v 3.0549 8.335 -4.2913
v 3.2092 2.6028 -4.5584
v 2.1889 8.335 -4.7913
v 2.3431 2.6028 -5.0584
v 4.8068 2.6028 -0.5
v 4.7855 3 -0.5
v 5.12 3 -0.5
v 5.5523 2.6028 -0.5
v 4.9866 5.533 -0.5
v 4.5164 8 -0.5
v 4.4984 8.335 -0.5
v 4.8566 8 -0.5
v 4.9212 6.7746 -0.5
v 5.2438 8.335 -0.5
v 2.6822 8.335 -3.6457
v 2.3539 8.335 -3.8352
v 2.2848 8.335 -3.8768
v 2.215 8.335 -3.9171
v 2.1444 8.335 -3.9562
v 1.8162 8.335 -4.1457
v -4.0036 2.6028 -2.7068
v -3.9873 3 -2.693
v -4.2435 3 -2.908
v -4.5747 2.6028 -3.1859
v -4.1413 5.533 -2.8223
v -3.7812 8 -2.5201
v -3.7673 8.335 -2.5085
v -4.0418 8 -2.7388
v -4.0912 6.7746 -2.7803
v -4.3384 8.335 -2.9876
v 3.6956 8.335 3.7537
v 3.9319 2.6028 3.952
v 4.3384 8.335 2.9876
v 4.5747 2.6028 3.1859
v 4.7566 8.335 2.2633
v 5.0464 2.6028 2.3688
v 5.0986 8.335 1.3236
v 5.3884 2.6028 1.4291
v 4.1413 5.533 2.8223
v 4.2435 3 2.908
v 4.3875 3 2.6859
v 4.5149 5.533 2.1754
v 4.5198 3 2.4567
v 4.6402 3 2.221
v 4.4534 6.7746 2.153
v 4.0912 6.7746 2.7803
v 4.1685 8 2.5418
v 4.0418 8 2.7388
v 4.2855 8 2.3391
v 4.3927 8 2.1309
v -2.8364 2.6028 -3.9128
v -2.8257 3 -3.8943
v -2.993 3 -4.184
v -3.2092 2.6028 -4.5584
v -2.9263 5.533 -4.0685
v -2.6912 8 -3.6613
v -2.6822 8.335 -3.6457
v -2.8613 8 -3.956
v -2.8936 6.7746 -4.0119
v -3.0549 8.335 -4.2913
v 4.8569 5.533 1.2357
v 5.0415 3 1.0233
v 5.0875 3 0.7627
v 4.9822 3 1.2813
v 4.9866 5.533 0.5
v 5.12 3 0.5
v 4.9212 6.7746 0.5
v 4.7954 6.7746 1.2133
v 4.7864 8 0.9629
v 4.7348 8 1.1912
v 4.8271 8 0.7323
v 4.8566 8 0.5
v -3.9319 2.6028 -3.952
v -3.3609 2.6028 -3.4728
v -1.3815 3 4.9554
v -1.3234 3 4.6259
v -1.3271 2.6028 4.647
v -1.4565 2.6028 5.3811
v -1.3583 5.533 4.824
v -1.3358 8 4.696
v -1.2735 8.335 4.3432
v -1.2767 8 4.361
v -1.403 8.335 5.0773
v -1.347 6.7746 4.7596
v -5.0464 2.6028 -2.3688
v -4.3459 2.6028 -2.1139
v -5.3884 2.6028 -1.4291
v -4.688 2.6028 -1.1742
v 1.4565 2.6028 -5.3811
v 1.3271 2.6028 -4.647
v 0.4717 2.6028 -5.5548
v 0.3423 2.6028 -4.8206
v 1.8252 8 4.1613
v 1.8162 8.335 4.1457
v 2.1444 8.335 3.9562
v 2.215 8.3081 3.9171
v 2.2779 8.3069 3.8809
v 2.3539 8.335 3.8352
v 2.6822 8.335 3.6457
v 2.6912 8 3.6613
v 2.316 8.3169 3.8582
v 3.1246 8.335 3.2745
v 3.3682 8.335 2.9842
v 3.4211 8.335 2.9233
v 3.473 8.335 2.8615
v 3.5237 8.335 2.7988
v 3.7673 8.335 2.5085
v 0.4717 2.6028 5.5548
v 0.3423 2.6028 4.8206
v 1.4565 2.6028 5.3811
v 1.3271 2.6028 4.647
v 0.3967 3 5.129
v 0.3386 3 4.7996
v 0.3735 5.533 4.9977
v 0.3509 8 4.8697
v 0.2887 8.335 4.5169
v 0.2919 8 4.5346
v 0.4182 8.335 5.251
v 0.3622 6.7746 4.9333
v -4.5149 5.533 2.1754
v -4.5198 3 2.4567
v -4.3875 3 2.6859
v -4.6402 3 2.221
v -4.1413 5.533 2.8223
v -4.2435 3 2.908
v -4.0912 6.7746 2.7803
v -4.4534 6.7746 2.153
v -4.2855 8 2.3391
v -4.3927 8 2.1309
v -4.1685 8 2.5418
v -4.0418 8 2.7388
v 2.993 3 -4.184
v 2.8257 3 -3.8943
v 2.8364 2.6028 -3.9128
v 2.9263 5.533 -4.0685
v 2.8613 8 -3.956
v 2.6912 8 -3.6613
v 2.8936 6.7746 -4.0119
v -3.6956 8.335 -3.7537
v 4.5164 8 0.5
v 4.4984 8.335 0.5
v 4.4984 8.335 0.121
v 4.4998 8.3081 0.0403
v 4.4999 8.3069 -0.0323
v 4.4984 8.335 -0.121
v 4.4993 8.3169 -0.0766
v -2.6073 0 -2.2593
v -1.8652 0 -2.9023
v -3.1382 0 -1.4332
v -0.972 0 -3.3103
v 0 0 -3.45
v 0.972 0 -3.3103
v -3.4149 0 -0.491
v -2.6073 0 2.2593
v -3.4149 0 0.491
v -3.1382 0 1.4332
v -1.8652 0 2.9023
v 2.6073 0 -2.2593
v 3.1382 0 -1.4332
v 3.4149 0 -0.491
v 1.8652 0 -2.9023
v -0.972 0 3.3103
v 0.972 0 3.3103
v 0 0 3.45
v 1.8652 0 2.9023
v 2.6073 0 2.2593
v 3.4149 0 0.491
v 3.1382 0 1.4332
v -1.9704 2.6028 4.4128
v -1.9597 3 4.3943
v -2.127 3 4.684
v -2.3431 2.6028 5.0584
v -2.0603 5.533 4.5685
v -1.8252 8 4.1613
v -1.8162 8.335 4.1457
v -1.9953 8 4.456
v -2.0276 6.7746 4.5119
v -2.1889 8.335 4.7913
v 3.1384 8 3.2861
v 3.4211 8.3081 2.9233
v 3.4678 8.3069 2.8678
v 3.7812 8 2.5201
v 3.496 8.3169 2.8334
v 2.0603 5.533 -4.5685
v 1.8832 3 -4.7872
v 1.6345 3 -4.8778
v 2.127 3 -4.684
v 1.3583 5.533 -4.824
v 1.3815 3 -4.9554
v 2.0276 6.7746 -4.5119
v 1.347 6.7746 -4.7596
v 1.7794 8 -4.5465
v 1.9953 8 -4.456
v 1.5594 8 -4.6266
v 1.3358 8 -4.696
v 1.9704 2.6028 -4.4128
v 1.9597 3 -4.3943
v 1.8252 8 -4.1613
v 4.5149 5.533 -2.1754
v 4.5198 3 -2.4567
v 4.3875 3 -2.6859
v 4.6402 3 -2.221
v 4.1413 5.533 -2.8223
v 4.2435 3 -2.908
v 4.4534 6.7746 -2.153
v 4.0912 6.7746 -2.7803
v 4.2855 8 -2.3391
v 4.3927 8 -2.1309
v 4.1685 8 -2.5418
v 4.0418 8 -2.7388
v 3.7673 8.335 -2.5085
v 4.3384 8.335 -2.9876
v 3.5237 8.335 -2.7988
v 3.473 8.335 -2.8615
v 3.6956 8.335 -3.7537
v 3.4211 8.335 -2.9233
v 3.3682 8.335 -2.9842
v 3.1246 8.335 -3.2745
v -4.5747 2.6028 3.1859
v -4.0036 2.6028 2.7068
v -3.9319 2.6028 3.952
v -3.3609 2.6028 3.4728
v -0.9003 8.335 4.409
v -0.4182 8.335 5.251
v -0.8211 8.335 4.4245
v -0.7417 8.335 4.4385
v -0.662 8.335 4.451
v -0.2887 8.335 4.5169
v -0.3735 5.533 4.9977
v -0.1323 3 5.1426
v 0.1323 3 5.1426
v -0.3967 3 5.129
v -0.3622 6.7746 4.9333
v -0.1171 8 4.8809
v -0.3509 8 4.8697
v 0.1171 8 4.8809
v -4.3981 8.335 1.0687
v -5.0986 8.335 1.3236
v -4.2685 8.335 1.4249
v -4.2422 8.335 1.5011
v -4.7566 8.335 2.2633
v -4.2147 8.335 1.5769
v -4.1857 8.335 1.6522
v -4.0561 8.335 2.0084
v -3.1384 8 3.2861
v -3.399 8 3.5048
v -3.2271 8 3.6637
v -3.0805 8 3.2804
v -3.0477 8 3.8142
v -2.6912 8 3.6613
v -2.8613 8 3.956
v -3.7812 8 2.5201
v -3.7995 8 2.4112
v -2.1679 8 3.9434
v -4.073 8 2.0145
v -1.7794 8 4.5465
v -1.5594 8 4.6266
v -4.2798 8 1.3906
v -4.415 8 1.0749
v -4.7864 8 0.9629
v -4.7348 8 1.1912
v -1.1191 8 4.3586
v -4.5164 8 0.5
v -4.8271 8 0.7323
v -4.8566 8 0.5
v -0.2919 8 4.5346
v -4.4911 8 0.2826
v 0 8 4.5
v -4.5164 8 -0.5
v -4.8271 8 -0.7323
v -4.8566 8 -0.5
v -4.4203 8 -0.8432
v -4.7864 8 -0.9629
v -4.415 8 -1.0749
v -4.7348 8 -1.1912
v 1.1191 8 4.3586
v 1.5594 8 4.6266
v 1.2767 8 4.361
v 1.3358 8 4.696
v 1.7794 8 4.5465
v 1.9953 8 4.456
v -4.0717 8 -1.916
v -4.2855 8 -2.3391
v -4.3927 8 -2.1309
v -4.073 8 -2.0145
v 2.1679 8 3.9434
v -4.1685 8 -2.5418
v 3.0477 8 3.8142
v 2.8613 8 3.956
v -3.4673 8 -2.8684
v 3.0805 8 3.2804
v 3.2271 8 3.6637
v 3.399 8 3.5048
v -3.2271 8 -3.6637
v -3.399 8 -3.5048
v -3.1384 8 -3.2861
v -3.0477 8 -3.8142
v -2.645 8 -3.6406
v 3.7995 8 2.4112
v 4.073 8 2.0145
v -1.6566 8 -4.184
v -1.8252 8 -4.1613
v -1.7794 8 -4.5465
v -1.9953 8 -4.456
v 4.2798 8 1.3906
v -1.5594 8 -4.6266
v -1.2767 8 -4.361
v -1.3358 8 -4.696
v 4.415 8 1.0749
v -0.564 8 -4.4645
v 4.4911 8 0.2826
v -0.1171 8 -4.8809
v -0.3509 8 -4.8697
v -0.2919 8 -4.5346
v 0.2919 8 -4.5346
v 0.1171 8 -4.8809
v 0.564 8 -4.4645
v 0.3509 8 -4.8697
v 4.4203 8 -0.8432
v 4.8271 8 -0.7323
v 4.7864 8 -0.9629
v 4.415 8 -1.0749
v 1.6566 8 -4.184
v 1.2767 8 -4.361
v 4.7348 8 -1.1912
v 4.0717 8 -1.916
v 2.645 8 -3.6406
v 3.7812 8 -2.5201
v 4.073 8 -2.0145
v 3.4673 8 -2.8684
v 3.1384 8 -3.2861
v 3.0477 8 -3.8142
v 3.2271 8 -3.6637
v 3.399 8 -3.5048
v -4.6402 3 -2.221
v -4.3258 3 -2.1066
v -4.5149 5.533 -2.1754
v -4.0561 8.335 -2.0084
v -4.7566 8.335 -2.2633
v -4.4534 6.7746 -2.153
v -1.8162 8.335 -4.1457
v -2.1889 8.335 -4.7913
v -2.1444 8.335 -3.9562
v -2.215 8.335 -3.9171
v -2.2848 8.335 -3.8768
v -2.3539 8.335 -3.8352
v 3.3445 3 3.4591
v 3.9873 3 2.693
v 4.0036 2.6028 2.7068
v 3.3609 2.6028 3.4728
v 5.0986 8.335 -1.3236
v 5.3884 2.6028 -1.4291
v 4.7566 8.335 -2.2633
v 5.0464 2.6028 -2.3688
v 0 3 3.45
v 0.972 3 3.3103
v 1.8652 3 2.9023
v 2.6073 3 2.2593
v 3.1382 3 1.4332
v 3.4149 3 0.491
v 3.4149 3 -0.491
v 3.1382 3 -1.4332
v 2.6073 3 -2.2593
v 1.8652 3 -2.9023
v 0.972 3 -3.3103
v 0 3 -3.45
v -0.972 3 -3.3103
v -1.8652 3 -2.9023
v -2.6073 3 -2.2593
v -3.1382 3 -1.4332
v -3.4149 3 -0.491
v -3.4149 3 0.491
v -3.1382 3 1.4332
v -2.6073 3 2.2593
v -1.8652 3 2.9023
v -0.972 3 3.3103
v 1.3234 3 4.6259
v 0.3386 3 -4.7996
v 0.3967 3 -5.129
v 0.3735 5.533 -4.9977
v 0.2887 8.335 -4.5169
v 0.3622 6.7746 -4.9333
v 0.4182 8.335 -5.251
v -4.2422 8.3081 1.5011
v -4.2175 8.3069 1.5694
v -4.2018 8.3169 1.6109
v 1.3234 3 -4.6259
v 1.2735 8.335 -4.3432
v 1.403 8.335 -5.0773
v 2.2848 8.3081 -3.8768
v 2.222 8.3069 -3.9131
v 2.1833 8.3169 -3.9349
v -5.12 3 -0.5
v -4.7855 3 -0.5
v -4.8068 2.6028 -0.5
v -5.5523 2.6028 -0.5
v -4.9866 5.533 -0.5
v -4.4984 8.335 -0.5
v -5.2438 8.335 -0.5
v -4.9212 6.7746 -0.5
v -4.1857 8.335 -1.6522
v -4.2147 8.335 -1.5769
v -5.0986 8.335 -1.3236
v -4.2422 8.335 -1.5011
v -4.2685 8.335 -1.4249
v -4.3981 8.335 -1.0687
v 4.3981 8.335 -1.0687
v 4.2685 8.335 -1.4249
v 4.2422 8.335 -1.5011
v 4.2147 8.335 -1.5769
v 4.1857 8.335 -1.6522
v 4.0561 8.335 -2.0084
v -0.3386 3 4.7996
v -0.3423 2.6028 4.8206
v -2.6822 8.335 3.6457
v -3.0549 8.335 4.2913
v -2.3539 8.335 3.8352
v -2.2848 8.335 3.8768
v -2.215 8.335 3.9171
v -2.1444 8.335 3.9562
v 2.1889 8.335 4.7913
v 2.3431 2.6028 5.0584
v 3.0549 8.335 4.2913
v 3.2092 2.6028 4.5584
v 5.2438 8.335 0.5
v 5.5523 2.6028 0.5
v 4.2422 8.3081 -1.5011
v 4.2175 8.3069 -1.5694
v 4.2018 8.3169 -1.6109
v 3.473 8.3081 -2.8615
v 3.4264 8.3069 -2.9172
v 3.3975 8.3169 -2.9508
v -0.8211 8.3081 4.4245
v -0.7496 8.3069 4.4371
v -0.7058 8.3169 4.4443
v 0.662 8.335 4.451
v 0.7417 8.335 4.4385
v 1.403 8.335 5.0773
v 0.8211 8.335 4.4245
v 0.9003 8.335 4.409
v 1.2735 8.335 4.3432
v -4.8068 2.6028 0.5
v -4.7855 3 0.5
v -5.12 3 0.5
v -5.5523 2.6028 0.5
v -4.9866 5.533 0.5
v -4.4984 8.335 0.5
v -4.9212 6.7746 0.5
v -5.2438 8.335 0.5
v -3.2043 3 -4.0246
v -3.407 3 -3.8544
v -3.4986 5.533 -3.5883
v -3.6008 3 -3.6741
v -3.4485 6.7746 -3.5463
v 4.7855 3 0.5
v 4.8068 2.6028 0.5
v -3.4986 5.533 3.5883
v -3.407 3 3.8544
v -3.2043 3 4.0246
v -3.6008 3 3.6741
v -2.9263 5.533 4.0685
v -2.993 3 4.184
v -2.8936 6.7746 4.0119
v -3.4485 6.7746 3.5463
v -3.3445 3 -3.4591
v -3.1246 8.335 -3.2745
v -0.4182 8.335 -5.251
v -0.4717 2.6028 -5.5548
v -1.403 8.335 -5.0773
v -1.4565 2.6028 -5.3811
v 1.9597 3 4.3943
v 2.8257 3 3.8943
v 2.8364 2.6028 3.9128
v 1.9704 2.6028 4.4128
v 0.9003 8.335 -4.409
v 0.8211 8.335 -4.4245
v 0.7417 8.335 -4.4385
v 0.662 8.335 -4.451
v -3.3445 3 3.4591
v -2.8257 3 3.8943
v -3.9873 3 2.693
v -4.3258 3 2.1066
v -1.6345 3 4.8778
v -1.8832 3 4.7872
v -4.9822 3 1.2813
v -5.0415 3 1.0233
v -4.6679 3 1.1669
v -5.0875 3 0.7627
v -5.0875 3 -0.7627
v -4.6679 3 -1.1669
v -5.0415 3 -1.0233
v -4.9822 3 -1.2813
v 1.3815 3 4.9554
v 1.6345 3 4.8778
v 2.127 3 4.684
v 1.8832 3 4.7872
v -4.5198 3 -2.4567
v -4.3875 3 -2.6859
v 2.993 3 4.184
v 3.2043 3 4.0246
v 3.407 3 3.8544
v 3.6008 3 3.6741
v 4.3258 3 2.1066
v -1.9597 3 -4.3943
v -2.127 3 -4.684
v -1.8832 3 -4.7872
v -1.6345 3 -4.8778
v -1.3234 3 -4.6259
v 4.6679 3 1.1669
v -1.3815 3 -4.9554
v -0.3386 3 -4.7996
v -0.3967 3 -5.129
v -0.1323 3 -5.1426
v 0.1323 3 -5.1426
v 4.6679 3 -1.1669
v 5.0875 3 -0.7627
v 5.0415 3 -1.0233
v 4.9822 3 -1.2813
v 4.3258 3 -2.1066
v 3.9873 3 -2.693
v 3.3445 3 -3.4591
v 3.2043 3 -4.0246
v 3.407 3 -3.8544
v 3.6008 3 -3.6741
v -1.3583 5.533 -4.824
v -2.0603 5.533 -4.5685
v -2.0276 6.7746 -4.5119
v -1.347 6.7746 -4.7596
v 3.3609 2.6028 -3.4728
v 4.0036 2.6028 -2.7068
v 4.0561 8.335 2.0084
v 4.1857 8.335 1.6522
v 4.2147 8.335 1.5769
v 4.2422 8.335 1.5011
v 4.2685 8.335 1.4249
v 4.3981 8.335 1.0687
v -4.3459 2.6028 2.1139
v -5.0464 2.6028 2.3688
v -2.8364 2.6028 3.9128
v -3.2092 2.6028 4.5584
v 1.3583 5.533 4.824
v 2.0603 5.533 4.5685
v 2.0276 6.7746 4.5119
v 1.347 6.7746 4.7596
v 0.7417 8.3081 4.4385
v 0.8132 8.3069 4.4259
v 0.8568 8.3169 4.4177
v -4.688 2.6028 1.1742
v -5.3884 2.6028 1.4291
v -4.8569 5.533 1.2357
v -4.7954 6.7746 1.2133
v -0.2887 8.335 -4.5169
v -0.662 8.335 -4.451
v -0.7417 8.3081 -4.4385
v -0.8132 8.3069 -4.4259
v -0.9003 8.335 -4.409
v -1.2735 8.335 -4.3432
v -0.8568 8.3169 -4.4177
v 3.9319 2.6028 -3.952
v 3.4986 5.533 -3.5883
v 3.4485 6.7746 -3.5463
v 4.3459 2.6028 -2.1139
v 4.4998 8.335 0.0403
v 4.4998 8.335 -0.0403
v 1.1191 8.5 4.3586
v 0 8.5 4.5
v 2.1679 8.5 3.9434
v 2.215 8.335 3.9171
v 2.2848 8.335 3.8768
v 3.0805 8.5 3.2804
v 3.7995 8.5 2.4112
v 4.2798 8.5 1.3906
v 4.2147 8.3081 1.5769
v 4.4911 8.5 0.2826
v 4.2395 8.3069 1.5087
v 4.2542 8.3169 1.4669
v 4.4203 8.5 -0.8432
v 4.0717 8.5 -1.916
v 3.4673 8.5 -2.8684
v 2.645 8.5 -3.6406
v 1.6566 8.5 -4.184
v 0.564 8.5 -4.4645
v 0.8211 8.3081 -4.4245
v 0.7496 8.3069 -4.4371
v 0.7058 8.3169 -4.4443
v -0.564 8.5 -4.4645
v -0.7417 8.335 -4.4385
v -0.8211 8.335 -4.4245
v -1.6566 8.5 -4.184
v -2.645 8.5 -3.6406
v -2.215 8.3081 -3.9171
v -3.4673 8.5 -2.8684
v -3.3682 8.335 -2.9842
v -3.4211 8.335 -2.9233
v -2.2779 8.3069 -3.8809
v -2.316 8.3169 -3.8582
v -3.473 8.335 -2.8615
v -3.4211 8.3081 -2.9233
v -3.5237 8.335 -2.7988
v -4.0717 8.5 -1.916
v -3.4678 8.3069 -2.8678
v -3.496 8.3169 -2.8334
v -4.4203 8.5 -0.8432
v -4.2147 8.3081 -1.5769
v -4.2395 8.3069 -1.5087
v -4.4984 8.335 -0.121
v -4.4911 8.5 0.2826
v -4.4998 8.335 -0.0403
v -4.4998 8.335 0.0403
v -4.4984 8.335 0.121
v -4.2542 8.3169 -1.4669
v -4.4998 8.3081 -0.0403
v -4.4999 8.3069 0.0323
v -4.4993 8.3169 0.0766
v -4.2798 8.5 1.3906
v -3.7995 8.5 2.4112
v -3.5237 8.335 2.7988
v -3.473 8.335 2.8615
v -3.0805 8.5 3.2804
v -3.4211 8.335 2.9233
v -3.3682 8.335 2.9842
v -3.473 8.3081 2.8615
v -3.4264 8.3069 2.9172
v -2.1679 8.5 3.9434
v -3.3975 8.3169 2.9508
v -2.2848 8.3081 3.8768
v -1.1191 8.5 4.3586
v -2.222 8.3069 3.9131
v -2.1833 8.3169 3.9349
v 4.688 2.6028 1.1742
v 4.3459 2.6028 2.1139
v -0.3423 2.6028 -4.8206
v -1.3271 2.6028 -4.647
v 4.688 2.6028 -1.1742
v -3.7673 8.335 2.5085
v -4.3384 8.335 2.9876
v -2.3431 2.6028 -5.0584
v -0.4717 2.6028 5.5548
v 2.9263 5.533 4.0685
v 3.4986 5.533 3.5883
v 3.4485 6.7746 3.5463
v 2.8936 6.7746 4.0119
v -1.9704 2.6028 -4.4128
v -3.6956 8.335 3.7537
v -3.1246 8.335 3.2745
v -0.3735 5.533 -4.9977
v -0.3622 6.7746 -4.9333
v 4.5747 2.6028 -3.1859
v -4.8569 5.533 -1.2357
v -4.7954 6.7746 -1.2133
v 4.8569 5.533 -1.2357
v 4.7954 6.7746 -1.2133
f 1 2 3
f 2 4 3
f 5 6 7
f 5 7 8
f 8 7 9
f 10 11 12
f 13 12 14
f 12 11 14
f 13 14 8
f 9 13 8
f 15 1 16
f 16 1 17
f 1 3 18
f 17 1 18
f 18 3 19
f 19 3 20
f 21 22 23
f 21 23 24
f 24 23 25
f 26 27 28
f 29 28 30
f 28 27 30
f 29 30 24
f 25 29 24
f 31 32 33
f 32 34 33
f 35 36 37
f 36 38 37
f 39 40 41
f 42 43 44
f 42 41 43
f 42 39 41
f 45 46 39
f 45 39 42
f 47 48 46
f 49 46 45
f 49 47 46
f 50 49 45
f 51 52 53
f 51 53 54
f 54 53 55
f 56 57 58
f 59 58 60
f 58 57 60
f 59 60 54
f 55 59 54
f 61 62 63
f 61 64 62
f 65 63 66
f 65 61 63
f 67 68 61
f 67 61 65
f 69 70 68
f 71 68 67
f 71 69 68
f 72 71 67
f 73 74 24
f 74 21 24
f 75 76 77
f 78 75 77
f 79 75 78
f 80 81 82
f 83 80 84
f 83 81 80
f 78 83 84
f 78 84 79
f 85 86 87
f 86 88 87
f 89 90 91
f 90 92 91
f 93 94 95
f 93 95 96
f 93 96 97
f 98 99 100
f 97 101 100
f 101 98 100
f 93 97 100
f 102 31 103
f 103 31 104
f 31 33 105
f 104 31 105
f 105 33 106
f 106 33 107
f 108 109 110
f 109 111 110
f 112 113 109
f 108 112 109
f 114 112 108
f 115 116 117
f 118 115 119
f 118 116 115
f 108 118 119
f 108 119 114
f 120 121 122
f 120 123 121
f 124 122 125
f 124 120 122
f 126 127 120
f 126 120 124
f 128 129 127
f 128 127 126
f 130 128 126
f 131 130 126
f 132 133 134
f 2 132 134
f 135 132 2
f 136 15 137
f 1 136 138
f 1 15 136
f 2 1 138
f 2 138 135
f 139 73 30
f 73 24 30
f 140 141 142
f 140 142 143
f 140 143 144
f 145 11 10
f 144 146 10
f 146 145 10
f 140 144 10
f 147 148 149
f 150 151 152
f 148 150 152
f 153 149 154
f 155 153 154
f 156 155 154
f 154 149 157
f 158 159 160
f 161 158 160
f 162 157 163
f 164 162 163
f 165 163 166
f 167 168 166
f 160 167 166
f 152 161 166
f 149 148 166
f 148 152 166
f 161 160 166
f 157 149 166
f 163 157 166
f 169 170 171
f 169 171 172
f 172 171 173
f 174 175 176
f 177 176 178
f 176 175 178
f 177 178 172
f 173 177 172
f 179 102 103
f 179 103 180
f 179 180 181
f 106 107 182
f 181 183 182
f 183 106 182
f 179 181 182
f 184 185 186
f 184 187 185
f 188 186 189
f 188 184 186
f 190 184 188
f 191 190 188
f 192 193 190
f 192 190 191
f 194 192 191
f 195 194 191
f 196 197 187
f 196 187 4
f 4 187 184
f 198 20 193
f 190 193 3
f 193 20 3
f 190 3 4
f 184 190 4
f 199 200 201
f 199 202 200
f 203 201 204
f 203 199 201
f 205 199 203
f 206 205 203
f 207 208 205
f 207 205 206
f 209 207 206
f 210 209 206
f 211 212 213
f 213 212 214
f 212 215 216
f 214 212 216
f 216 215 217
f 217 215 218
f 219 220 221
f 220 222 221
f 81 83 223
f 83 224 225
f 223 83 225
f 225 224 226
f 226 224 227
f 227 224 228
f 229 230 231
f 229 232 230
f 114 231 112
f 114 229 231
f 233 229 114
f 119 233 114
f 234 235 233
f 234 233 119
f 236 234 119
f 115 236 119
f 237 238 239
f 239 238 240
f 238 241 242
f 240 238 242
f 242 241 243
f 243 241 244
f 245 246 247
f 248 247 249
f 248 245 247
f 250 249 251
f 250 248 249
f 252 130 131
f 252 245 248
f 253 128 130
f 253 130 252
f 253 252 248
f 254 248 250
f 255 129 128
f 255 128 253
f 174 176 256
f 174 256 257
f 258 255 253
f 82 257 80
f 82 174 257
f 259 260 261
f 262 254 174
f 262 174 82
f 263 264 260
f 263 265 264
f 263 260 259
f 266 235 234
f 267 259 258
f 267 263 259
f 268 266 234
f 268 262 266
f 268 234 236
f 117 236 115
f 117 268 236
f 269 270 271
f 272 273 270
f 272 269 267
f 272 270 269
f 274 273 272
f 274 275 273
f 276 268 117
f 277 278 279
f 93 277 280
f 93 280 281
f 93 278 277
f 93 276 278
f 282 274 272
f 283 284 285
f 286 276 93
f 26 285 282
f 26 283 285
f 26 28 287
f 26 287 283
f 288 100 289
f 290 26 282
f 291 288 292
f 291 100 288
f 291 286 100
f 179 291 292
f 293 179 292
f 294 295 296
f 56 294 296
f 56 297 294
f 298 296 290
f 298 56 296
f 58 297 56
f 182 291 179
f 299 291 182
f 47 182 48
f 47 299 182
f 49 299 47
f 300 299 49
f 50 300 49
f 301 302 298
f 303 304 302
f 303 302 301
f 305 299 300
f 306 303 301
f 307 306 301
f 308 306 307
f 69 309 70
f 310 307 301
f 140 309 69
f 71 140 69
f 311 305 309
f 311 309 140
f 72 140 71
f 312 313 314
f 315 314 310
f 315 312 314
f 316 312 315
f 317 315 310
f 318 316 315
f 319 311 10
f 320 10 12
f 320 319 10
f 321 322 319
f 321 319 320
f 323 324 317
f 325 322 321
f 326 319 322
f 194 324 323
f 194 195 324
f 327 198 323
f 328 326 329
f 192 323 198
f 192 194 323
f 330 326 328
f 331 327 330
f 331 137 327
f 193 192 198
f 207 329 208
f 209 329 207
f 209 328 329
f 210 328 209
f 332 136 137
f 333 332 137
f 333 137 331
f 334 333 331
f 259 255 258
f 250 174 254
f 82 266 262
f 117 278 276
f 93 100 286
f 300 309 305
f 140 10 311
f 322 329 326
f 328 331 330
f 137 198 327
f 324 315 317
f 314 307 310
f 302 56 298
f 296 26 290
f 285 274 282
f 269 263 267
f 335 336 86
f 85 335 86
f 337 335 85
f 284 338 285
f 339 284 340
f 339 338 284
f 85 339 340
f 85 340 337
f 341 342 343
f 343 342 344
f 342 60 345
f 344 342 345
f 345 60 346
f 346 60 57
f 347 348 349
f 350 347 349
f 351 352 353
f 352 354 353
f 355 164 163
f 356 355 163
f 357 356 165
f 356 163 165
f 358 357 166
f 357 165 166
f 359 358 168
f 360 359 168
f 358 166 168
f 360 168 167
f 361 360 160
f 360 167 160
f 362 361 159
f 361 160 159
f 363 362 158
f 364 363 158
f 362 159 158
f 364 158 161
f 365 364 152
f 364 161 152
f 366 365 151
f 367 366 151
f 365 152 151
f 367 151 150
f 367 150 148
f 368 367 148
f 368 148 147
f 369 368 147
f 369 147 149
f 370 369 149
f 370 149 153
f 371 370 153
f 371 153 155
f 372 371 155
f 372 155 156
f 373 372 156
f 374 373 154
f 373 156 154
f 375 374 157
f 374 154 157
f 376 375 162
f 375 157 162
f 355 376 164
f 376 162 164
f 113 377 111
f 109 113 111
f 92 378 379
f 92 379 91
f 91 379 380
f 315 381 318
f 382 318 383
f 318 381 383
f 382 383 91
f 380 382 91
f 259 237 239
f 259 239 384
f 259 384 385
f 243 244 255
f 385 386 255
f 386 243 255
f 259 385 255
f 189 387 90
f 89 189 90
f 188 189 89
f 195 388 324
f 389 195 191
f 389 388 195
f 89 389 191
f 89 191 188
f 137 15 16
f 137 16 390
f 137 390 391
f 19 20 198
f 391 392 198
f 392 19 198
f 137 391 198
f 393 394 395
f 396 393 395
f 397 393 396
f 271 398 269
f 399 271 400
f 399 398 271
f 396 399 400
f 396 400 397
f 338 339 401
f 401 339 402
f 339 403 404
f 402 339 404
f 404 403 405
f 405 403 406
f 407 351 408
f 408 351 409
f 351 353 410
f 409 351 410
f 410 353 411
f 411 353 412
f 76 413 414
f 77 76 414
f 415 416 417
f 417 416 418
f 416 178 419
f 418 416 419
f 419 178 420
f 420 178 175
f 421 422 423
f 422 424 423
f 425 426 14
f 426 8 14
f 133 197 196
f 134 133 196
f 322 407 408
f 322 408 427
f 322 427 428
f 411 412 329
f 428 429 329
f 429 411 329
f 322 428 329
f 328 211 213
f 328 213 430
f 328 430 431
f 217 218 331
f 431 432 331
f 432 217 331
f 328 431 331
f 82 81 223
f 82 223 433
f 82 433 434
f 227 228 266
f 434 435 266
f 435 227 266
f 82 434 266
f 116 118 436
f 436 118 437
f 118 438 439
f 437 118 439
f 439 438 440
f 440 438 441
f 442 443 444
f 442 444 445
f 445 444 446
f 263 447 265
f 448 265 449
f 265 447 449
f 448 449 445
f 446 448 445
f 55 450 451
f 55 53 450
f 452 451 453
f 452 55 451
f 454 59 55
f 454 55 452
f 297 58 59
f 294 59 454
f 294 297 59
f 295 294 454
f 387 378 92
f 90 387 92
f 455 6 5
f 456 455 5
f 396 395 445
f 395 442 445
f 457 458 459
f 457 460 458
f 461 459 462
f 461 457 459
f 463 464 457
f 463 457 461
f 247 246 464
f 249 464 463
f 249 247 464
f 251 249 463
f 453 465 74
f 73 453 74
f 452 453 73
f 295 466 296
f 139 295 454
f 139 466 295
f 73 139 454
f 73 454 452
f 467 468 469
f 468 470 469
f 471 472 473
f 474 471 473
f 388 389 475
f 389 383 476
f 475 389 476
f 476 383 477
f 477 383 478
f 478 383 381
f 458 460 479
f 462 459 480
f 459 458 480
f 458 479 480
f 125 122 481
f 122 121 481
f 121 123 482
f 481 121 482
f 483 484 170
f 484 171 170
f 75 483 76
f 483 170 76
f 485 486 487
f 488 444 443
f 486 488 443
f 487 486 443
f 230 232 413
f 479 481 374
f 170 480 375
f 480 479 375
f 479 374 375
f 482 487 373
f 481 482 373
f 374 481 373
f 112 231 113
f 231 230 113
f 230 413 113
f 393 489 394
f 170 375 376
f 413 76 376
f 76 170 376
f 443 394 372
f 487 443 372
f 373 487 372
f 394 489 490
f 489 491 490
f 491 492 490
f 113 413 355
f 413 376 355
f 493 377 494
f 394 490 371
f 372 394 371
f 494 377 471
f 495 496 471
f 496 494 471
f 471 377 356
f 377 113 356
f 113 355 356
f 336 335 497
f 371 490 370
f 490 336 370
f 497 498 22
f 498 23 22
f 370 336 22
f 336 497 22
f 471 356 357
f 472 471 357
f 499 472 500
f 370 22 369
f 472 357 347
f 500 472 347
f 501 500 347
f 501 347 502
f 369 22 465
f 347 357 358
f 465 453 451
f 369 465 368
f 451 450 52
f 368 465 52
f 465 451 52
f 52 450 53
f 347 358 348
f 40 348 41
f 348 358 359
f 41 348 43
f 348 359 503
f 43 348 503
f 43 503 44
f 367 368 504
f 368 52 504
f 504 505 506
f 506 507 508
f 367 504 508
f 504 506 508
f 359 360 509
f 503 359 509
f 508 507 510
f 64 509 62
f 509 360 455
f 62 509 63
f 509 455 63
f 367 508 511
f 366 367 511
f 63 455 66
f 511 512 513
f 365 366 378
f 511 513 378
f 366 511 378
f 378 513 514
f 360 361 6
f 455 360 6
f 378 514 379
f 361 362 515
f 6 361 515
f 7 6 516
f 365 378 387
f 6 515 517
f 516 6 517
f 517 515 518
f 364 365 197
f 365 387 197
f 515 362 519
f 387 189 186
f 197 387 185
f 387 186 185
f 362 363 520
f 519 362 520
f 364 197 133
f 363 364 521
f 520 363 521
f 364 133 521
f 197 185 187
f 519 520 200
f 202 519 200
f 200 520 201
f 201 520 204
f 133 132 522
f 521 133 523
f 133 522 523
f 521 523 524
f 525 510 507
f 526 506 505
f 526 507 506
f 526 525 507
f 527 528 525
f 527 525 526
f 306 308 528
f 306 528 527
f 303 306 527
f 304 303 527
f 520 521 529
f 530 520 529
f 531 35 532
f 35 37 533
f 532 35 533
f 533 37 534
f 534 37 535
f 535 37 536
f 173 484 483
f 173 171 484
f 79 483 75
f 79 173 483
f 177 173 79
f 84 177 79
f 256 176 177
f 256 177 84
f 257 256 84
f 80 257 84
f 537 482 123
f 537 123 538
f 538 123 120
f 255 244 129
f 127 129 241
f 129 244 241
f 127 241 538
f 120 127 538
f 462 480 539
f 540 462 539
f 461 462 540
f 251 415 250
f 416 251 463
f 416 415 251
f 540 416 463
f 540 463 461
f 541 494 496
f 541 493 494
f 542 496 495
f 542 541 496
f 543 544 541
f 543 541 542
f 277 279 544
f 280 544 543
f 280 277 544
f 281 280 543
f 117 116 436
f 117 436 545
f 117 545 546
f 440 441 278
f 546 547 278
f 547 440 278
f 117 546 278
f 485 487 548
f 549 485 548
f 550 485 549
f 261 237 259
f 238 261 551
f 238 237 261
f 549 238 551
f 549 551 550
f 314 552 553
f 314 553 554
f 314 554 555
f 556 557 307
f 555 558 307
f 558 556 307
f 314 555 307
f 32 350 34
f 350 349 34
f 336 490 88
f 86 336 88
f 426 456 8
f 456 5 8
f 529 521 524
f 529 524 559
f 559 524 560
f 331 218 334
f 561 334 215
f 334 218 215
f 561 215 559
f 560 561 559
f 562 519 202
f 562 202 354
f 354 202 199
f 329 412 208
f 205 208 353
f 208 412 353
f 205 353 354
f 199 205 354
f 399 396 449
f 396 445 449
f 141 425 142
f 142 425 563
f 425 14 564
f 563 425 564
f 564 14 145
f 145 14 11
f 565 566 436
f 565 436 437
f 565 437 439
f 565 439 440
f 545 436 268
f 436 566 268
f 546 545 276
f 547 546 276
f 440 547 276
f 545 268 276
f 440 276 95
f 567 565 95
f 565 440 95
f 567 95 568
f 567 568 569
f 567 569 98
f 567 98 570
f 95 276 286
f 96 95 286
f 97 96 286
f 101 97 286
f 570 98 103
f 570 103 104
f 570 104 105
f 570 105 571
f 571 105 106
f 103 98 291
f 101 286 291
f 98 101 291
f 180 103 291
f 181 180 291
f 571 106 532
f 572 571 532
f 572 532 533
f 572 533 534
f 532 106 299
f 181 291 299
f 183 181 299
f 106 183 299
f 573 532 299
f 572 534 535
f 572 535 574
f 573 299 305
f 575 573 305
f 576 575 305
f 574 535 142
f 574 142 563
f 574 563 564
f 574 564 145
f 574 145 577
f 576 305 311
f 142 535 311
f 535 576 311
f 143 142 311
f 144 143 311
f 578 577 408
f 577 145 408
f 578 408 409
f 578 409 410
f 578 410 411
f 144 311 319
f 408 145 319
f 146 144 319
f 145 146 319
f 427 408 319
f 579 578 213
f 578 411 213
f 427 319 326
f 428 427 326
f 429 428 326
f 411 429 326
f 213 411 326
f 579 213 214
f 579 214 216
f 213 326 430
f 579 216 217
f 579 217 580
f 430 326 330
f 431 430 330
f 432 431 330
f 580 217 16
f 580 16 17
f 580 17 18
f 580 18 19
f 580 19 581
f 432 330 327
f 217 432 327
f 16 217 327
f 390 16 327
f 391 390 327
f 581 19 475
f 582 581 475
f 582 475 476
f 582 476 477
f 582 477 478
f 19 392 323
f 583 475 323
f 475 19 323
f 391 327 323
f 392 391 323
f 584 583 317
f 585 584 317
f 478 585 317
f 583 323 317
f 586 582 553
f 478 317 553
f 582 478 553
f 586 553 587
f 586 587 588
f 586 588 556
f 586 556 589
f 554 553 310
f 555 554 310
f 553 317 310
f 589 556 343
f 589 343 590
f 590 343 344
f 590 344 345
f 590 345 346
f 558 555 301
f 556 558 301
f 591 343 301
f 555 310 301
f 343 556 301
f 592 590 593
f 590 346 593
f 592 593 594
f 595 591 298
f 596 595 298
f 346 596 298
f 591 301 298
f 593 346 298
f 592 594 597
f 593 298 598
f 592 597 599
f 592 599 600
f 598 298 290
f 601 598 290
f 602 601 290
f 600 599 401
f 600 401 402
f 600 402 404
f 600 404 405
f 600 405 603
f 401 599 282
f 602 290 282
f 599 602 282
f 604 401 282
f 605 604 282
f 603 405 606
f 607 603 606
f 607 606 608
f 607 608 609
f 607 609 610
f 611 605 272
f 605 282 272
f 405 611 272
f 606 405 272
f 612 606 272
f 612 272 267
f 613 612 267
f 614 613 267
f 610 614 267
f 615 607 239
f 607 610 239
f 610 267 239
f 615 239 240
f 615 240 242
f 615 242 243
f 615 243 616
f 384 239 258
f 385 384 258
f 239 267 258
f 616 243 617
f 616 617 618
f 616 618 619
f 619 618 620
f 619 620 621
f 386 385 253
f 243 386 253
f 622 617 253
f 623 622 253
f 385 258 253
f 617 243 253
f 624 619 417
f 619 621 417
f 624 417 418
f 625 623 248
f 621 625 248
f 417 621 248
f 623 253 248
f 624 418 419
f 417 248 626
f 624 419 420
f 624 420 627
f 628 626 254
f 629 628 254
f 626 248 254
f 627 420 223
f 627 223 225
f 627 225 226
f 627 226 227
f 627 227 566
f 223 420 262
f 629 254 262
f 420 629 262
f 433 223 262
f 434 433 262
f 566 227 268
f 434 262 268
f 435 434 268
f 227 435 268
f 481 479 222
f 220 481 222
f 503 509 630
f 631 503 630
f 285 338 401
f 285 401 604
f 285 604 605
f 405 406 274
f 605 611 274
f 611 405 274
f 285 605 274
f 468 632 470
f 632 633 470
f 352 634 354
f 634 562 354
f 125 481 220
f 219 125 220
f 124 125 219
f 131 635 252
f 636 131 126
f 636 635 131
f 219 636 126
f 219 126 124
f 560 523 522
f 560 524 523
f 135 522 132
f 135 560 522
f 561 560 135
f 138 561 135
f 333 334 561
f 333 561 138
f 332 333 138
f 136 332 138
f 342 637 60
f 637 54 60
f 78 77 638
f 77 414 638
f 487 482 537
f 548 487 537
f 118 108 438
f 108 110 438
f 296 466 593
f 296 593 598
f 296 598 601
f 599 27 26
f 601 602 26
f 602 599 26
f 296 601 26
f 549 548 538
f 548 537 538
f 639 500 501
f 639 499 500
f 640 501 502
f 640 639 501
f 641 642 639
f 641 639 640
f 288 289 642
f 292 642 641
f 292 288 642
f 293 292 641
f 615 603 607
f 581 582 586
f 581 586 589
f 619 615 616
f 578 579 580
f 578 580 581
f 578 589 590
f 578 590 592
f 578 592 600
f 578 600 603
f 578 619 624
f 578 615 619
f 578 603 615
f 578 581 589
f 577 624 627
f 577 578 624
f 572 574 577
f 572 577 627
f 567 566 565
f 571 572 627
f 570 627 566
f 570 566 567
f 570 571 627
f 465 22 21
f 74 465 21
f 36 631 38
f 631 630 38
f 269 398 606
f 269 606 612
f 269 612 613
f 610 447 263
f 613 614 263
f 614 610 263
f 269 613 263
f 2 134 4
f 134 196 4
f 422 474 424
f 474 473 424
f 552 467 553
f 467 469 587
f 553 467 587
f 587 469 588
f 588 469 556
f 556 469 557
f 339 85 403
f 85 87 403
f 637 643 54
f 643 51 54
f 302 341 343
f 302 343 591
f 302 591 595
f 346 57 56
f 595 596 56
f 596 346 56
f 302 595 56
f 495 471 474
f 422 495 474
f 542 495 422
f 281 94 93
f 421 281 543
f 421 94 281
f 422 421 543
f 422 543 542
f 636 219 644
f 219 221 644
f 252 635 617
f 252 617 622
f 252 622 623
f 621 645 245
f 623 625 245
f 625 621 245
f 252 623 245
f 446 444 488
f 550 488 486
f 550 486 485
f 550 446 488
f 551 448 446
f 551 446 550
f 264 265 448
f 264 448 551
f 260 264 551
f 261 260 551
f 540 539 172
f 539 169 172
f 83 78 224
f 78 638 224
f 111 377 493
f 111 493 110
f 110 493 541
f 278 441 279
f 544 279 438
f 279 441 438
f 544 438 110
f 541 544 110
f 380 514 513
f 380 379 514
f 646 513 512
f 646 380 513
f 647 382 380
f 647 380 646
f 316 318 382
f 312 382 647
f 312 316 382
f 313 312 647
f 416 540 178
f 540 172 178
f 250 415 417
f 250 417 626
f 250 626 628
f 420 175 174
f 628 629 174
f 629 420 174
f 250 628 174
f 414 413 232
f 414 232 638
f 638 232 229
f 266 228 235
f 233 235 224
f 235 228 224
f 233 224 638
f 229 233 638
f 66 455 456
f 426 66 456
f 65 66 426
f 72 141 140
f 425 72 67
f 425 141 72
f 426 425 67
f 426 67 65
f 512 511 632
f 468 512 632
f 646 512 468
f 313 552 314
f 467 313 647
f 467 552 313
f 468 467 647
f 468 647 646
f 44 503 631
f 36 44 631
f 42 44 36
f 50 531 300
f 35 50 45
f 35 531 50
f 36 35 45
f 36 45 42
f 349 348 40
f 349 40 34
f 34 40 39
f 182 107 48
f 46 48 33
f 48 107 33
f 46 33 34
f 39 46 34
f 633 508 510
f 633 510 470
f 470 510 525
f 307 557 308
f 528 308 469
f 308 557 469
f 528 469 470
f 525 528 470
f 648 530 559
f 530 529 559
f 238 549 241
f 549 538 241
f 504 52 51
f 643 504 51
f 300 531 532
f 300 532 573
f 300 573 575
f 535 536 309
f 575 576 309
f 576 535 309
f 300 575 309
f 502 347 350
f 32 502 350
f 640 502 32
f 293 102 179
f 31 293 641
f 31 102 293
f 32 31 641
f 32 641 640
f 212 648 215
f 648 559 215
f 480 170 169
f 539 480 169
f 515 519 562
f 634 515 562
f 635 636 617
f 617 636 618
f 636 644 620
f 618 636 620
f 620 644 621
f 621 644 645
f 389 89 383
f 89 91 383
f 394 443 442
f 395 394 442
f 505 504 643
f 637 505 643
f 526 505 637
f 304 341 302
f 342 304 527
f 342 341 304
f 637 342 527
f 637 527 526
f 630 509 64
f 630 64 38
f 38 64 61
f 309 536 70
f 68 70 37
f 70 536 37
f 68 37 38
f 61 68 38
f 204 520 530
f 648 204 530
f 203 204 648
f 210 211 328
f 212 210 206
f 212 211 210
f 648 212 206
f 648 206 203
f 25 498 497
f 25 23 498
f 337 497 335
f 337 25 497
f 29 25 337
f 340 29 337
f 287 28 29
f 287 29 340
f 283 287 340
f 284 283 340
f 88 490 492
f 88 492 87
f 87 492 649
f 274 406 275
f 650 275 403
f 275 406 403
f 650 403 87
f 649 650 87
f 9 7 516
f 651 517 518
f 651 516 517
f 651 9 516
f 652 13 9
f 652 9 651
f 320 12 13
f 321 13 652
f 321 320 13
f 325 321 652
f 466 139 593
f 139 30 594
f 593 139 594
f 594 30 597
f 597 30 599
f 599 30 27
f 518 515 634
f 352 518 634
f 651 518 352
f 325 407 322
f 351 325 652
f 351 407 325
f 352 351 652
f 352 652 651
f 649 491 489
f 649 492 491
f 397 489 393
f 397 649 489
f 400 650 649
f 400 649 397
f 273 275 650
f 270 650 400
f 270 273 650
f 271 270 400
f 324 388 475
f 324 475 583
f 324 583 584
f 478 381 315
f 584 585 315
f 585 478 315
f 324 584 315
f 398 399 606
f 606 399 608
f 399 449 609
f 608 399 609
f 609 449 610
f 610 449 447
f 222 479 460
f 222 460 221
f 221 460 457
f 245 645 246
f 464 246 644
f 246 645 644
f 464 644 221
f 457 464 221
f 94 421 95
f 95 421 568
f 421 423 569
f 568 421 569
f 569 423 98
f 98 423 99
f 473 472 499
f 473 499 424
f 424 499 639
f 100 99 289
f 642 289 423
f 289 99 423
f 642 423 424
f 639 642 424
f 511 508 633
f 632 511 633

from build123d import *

# Parameters (mm, degrees)
SKETCH1_R           = 3.45
BOSS_EXTRUDE1_DEPTH = 3
SKETCH2_R           = 5.144351969
BOSS_EXTRUDE2_DEPTH = 5
BOSS_EXTRUDE2_TAPER = 3
BOSS_EXTRUDE3_DEPTH = 0.5
CIRPATTERN1_COUNT   = 18
SKETCH5_R           = 4.5
BOSS_EXTRUDE5_DEPTH = 0.5


with BuildPart() as part:
    # Sketch1 → Boss-Extrude1 (new body)
    with BuildSketch(Plane(origin=(0, 0, 0), x_dir=(1, 0, 0), z_dir=(0, 1, 0))):
        with Locations(Location((0, 0, 0), (0, 0, 270))):
            Circle(SKETCH1_R)
    extrude(amount=BOSS_EXTRUDE1_DEPTH)

    # Sketch2 → Boss-Extrude2 (add)
    with BuildSketch(Plane(origin=(0, 3, 0), x_dir=(1, 0, 0), z_dir=(0, 1, 0))):
        Circle(SKETCH2_R)
    extrude(amount=BOSS_EXTRUDE2_DEPTH, taper=BOSS_EXTRUDE2_TAPER)

    # Sketch4 → Boss-Extrude3 (add, symmetric)
    with BuildSketch(Plane.XY):
        Polygon((-4.498373747, 8.334987069), (-4.806833662, 2.602773665), (-5.552278454, 2.602773665), (-5.24381854, 8.334987069), align=None)
    boss_extrude3 = extrude(amount=BOSS_EXTRUDE3_DEPTH, both=True)

    # CirPattern1: Boss-Extrude3 ×18 about axis
    cirpattern1_axis = Axis((0, 0, 0), (0, 1, 0))
    for i in range(1, CIRPATTERN1_COUNT):
        add(boss_extrude3.rotate(cirpattern1_axis, i * 360 / CIRPATTERN1_COUNT))

    # Sketch5 → Boss-Extrude5 (add)
    with BuildSketch(Plane(origin=(0, 8, 0), x_dir=(1, 0, 0), z_dir=(0, 1, 0))):
        with Locations(Location((0, 0, 0), (0, 0, 270))):
            Circle(SKETCH5_R)
    extrude(amount=BOSS_EXTRUDE5_DEPTH)


solid = part.part
